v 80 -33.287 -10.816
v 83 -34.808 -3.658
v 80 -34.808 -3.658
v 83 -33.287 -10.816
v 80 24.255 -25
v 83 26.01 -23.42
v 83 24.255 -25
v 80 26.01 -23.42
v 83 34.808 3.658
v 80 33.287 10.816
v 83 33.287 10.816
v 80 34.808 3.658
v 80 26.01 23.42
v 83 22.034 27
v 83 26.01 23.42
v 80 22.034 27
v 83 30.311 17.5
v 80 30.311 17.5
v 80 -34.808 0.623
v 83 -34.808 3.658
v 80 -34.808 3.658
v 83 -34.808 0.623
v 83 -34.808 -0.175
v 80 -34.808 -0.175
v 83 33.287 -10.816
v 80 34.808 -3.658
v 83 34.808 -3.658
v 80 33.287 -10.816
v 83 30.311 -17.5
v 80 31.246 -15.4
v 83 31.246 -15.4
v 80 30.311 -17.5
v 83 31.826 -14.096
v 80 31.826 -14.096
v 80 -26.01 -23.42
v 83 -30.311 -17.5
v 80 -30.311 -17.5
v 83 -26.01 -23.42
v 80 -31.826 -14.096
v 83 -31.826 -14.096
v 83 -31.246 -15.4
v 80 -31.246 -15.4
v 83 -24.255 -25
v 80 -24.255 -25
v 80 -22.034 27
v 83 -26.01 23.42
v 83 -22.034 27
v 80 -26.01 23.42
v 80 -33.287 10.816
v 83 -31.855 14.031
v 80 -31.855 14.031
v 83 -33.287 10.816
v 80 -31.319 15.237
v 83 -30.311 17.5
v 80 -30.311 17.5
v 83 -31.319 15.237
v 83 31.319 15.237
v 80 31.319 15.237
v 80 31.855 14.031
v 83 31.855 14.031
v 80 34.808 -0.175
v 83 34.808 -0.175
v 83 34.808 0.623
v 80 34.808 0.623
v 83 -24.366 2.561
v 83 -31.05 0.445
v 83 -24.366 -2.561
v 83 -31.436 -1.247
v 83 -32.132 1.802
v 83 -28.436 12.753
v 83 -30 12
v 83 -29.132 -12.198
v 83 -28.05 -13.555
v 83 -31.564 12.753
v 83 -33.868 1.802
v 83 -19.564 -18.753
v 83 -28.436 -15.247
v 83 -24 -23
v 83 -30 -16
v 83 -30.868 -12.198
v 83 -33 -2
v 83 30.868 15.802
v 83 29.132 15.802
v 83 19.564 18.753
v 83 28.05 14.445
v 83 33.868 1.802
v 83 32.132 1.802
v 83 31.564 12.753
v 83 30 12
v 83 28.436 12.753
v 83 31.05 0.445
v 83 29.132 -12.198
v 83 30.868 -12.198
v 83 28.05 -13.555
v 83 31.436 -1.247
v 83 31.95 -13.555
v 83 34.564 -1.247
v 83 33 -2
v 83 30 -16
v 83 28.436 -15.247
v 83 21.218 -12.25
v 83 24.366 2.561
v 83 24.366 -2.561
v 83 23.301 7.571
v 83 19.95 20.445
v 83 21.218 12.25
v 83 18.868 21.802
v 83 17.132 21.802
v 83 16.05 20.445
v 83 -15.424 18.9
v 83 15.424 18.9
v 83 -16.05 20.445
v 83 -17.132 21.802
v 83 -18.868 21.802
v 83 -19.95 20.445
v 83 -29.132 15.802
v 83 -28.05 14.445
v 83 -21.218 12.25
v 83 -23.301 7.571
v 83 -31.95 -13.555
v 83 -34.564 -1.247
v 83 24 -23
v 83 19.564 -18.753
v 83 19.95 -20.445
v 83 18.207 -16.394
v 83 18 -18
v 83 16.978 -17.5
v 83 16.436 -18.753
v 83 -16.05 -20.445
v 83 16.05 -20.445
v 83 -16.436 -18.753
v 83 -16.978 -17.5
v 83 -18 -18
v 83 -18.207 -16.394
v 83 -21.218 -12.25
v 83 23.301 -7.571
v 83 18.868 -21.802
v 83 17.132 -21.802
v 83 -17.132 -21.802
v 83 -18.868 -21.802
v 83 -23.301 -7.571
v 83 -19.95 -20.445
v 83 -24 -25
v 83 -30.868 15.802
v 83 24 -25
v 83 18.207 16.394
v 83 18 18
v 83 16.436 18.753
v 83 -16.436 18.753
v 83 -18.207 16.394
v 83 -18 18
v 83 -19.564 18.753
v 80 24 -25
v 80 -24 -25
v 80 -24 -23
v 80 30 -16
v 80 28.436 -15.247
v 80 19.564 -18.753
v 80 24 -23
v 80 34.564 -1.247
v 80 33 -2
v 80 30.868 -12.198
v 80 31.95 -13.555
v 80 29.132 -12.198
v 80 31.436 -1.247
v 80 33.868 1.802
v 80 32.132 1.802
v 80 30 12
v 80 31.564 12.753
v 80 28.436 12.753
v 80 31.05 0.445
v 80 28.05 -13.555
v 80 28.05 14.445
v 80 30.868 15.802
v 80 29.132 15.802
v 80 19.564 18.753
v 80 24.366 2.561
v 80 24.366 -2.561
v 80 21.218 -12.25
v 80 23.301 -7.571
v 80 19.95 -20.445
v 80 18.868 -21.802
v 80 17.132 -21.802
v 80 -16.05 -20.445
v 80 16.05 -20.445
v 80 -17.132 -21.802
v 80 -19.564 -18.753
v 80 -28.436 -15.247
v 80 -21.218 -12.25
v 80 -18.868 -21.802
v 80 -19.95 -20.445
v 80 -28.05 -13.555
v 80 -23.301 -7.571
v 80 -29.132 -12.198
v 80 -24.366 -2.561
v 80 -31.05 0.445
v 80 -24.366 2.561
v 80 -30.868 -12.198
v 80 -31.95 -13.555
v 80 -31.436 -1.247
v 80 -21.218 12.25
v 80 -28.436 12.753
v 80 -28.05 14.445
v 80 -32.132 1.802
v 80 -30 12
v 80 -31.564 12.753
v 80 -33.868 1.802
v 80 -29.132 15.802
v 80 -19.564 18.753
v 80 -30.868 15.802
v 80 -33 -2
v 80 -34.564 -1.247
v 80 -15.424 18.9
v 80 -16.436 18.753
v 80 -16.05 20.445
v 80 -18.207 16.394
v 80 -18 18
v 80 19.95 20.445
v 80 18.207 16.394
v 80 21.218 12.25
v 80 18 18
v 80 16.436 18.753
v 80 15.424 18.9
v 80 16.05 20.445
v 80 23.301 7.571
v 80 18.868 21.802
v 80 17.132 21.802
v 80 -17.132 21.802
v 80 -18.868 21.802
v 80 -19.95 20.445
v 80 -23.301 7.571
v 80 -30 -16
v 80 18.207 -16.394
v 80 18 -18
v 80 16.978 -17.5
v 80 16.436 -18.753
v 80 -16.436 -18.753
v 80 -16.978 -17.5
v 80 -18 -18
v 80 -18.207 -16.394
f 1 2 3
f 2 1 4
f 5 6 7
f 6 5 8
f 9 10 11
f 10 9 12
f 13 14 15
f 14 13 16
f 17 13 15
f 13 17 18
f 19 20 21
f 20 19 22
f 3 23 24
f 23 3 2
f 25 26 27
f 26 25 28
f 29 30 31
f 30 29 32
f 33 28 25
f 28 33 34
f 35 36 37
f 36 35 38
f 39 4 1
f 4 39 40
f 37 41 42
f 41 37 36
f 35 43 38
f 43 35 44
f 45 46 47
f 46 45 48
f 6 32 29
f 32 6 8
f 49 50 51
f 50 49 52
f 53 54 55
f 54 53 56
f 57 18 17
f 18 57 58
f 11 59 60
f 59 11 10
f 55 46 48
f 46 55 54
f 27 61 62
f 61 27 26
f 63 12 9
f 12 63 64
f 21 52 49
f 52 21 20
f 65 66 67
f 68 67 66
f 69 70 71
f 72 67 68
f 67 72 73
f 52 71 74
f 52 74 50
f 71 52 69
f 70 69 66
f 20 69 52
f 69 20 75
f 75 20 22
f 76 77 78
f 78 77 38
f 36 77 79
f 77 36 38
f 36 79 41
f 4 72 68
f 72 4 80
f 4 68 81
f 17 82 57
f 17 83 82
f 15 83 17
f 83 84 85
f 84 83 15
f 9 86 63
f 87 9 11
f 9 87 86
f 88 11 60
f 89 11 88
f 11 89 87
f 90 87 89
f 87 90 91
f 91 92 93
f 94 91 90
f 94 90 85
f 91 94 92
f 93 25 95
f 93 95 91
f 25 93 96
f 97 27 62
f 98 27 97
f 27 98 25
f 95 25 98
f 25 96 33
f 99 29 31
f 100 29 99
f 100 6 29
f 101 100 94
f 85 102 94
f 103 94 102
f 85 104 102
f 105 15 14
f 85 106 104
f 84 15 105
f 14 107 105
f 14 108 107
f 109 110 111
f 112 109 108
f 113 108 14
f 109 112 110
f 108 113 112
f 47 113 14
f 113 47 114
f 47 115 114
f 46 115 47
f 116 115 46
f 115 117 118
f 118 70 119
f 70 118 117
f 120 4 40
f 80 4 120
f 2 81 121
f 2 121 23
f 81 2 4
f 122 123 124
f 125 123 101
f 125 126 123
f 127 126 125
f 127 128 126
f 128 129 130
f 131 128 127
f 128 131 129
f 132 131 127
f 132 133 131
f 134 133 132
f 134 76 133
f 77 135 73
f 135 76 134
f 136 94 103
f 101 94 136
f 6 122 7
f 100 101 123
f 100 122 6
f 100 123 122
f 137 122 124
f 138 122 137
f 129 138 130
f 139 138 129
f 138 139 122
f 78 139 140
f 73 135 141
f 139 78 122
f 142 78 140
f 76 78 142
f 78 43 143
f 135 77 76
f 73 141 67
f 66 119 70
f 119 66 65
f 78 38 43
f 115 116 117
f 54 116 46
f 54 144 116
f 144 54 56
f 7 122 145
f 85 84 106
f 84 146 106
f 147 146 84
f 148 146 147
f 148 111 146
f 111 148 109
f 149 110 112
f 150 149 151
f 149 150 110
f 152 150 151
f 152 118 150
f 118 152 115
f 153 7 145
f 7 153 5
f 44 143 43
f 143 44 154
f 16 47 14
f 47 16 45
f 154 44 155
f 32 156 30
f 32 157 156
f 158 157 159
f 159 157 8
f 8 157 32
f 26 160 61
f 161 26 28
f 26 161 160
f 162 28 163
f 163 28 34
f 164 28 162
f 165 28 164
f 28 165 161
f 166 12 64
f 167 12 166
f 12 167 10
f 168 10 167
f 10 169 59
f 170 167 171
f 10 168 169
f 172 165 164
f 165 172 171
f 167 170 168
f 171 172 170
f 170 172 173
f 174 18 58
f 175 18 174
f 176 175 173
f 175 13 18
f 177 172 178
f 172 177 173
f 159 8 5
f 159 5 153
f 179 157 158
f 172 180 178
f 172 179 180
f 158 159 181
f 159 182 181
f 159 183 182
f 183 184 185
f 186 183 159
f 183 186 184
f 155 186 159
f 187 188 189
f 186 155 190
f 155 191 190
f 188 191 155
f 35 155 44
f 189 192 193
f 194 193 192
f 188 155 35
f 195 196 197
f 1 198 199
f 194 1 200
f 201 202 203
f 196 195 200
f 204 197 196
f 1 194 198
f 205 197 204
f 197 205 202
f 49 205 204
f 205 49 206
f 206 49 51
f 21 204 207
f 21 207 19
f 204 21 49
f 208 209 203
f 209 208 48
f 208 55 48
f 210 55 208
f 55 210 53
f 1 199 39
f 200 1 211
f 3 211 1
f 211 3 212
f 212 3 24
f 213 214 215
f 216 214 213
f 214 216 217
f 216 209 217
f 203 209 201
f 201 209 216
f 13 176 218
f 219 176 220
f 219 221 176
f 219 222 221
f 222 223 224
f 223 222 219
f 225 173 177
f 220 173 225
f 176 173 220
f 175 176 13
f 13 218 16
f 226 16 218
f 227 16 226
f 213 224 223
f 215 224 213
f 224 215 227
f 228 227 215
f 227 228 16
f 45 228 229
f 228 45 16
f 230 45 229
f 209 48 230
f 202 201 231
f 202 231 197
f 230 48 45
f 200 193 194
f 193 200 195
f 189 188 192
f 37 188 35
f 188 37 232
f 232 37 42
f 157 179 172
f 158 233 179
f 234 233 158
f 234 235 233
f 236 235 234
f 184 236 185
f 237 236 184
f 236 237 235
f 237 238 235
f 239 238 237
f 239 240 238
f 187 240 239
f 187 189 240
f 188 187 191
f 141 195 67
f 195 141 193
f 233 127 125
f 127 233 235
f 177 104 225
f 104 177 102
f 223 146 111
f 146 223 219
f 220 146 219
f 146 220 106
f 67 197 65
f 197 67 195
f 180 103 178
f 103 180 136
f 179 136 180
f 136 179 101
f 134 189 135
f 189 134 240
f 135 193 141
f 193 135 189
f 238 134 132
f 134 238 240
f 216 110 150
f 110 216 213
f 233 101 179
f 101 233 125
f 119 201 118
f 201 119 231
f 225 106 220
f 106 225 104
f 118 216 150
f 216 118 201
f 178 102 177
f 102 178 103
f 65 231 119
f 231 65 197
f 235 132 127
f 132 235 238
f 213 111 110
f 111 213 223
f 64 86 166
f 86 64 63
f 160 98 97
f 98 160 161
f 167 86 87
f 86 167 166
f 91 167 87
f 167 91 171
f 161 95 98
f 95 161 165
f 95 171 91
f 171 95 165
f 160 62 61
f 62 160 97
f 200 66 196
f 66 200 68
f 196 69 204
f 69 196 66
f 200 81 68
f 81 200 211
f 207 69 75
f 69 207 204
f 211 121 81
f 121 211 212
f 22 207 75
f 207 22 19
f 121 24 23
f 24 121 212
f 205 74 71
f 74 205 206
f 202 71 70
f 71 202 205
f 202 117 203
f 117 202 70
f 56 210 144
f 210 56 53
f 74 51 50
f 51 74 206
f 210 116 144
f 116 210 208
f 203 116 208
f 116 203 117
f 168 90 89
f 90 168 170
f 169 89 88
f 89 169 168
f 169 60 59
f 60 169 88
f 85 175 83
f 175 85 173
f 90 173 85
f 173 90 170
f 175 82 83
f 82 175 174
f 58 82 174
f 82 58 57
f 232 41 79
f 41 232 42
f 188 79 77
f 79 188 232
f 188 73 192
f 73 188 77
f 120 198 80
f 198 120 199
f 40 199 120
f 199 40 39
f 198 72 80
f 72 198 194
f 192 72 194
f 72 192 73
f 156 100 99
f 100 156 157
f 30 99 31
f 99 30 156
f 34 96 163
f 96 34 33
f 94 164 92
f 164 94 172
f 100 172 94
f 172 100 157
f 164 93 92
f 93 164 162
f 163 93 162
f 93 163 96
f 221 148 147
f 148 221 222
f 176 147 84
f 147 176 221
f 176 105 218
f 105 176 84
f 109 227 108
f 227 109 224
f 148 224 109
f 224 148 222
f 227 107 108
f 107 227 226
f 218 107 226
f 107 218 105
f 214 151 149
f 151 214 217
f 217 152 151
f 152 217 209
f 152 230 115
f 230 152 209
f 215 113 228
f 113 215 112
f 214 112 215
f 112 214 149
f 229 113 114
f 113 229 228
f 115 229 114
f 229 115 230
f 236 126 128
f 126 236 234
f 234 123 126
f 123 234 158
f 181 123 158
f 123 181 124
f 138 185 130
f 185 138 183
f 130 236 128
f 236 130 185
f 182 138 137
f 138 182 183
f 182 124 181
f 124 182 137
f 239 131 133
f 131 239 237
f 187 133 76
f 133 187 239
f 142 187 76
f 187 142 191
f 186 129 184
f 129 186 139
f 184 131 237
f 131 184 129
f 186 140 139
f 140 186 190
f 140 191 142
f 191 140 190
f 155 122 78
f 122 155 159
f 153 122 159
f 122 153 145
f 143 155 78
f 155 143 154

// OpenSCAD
// file: rib.scad
module solid_rib(){
scale(0.42)
linear_extrude(file = "rib/NACA_4415_circles_lighter.dxf",
height = 10, convexity = 10
);
}


module rib(rod_leading,rod_trailing){
difference(){
solid_rib();
translate([12,11,-1])
cylinder(r=rod_leading/2,h=100);

translate([146,5,-1])
cylinder(r=rod_trailing/2,h=100);

}
}

rib(8,6);
// file: right_wing.scad
 
use<rib.scad>;
use <left_wing.scad>



module vrib(){
rotate([90,0,0])
rib(8,6);
}

module rods_right_wing(){

mirror([0,1,0])
rods_left_wing();

}

module right_wing(){
mirror([0,1,0])
left_wing();

}

right_wing();
// file: left_wing.scad
 
use<rib.scad>;

module vrib(){
rotate([90,0,0])
rib(8,6);
}

module rods_left_wing(){

translate([0,-52,0]){
// Rods
translate([0,50,0])
rotate([90,0,0])
translate([12,11,14])
cylinder(r=9/2,h=840);

translate([0,50,0])
rotate([90,0,0])
translate([146,5,14])
cylinder(r=7/2,h=840);

}
}

module left_wing(){

rods_left_wing();

translate([0,-52,0]){


// Ribs
for(i=[0:6])
translate([0,-i*((850-50)/6),0])vrib();
}

}

left_wing();
// file: wings_support.scad
use <wings.scad>;

module rod_supports(){
  difference(){
  union(){
  translate([19+0.5,-24+4+0.5,25]) cube([155-8-30-1,40-1,5]);

  translate([19+0.5-18,-24+4+0.5-10,30]) cube([155-8-30-1+36,40-1+20,18]);
  }
  union(){
    rods_both_wings();
    translate([19.5,-20.5,33]) cube([155-8-30-1,40-1,50]);
    rotate([0,3,0]) translate([19+0.5-18,-24+4+0.5-10,49]) cube([155-8-30-1+36,40-1+20,18]);
  }
  }
}


  //both_wings();

//
//module rod_supports(){
//  // Supports for wing rods (without holes)
//
//difference(){
//union(){
//  // rod suport front (with cover screw holes)
//    translate([1, -40, 7]) cube([18, 80, 17]);
//    translate([1, -3/2, -40]) cube([18, 3, 60]);
//    translate([1, -40, -25]) cube([18, 80, 8]);
//
//  difference(){
//    union(){
//      // rod suport back (with cover screw holes)
//      translate([135, -40, 1]) cube([18, 80, 23]);
//      translate([136, -3/2, -40]) cube([18, 3, 48]);
//    }
//    union(){
//      translate([134, -46/2, 12])
//      cube([19+2, 46, 30]);
//    }
//  }
//}
//  difference(){
//    rotate([0, 90, 0]) cylinder(r = 100 / 2, h = 155);
//    rotate([0, 90, 0]) cylinder(r = 70 / 2, h = 155);
//  }
//}
//
//}
rod_supports();
// file: body_rib.scad
module body_rib_solid(height){
difference(){
  translate([0,-35,-35])cube([height,70,70]);
  union(){
    difference(){
      translate([-1,0,0]) rotate([0,90,0]) cylinder(r=100,h=height+2);
      translate([-1,0,0]) rotate([0,90,0]) cylinder(r=35,h=height+2);
    }
    // Down plane
    translate([-1,-25,-35])cube([height+1,50,10]);
    // Upper plane
    translate([-1,-25,27])cube([height+1,50,30]);
  }
}
}


module body_rib(height){
  difference(){
    body_rib_solid(height);
    scale([1.1,0.7,0.7]) body_rib_solid(height);
  }
}


body_rib(3);
// file: tail.scad
module tail_up_front(){
  translate([0,0,2]){
    difference(){
      union(){
        scale(0.8) translate([500,-65.2,-13]){
          difference(){
            translate([0,-22,0]) scale([0.6,0.4,0.6])
              linear_extrude(file = "tail/front.dxf",height = 200, convexity = 10);
            union(){
              translate([110,60-5,-1])
              cube([36,70+5,20+15]);
              translate([110,60-5,101])
              cube([36,70+5,20]);
              translate([110,60-5,30+15])
              cube([16,70+5,60-15]);
            }
          }
        }
      }
      translate([400,-100,-7.5-300])cube(300);
    }
    translate([0,0,3])tail_upper_socket();
  }
}

module tail_front(){
difference(){
  union(){
    scale(0.8) translate([500,-65.2,-13]){
      difference(){
        translate([0,-22,0]) scale([0.6,0.4,0.6])
          linear_extrude(file = "tail/front.dxf",height = 200, convexity = 10);
        union(){
          translate([110,60-5,-1])
          cube([36,70+5,20+15]);
          translate([110,60-5,101])
          cube([36,70+5,20]);
          translate([110,60-5,30+15])
          cube([16,70+5,60-15]);
        }
      }
    }
  }
  translate([400,-100,-7.501])cube(300);
}

}

module tail_back(){
  scale(0.8) translate([500,-65.2,-13]) {
  difference(){
  scale([0.6,0.3,0.6])
  scale([0.6,1,1])
  translate([120,0,0])
  linear_extrude(file = "tail/back.dxf",height = 200, convexity = 10);
  union(){
    translate([110,60,18+15])
    cube([22,70,120-36-15]);
    translate([110,0,0]) rotate([0,45+14,0]) cube([100,297,300]);
    translate([110,0,-1-5+3]) cube([60,297,11]);
  }
  }
  }

}

module tail_rod(){
      translate([110, 0, -12])rotate([0,90,0])cylinder(r=3.7,h=370);
}

module tail_unstranlated(){
difference(){
union(){
  tail_front();
  tail_back();
}
    translate([120,65,-1])
cylinder(r=2,h=200);

}
}

module tail(){
  difference(){
    tail_unstranlated();
    tail_rod();
  }
}

module tail_socket(){
  difference(){
    translate([450,0,-10]) cube([70,20,5],center=true);
    union(){
      tail_rod();
      translate([450,-7,-100]) cylinder(r=2,h=400);
      translate([475,-8,-100]) cylinder(r=2,h=400);
      translate([425,-6,-100]) cylinder(r=2,h=400);
      translate([450,7,-100]) cylinder(r=2,h=400);
      translate([475,8,-100]) cylinder(r=2,h=400);
      translate([425,6,-100]) cylinder(r=2,h=400);
    }
  }
}

module tail_upper_socket(){
  difference(){
    translate([450,0,-10]) cube([70,20,3],center=true);
    union(){
      translate([450,-7,-100]) cylinder(r=2,h=400);
     translate([475,-8,-100]) cylinder(r=2,h=400);
     translate([425,-6,-100]) cylinder(r=2,h=400);
     translate([450,7,-100]) cylinder(r=2,h=400);
     translate([475,8,-100]) cylinder(r=2,h=400);
     translate([425,6,-100]) cylinder(r=2,h=400);
    }
  }
}

module tail_socket_bottom(){
  back_wheel();
  difference(){
    translate([450,0,-19]) cube([70,20,3],center=true);
    union(){
      tail_rod();
      translate([450,-7,-100]) cylinder(r=2,h=400);
     translate([475,-8,-100]) cylinder(r=2,h=400);
     translate([425,-6,-100]) cylinder(r=2,h=400);
     translate([450,7,-100]) cylinder(r=2,h=400);
     translate([475,8,-100]) cylinder(r=2,h=400);
     translate([425,6,-100]) cylinder(r=2,h=400);
    }
  }
}

module back_wheel(){
difference(){
 translate([470,0,-28]) cube([20,6,20],center=true);
 translate([470-10,-6+12,-28-20]) rotate([0,45,0]) cube([40,40,40],center=true);
}
}

module elevator_fixed(){
difference(){
  union(){
    translate([500*0.8,48/0.7,-66]) rotate([90,0,0])
    scale([0.48,0.24,0.7]) linear_extrude(file = "tail/front.dxf",height = 200, convexity = 10);
  }
  union(){
    tail_rod();
      translate([450,-7,-100]) cylinder(r=2,h=400);
     translate([475,-8,-100]) cylinder(r=2,h=400);
     translate([425,-6,-100]) cylinder(r=2,h=400);
     translate([450,7,-100]) cylinder(r=2,h=400);
     translate([475,8,-100]) cylinder(r=2,h=400);
     translate([425,6,-100]) cylinder(r=2,h=400);
    translate([150,-200,-17-5/2]) cube([1000,1000,5]);
    translate([490,-60,-100]) cube([50,117,300]);
    translate([497,200,-12.5]) rotate([90,0,0]) cylinder(r=1,h=400);
  }
}
}

module elevator(){
  difference(){
    difference(){
      translate([500*0.8-3+35,48/0.7,-66]) rotate([90,0,0]) scale([0.3,0.24,0.7])
      linear_extrude(file = "tail/back.dxf",height = 200, convexity = 10);
      union(){
        translate([150,-200,-17-5/2]) cube([1000,1000,5]);
        translate([490,-90,-100]) cube([16,31,300]);
        translate([490,-60+117+1-2,-100]) cube([16,297,300]);
      }
  }
    translate([497,200,-12.5]) rotate([90,0,0]) cylinder(r=1,h=400);
  }
  
}

module tail_full(){
  tail();
  tail_up_front();
  tail_rod();
  tail_socket();
  tail_socket_bottom();
  elevator_fixed();
  elevator();
}


tail_full();
// file: nose.scad
module nose_one_hole(){
  translate([-25,18,20])
  rotate([0,90,0])
  cylinder(r=2,h=600);
  nose_one_countersunk();
}

module nose_one_countersunk(){
  translate([-30,18,20])
  rotate([0,90,0])
  cylinder(r=3.2,h=20);
}

module nose_one_screw_cylinder(){
  translate([-21,18,20]) rotate([0,90,0]) cylinder(r=3.6,h=21);
}

module nose_screw_cylinders(){
  mirror([0,0,0]) nose_one_screw_cylinder();
  mirror([0,1,0]) nose_one_screw_cylinder();
  mirror([0,0,1]) nose_one_screw_cylinder();
  mirror([0,1,0])mirror([0,0,1]) nose_one_screw_cylinder();
}

module nose_holes(){
  mirror([0,0,0]) nose_one_hole();
  mirror([0,1,0]) nose_one_hole();
  mirror([0,0,1]) nose_one_hole();
  mirror([0,1,0])mirror([0,0,1]) nose_one_hole();
}

module nose(){

difference(){
  nose_no_holes();
  nose_holes();
}

}

module nose_no_holes(){
      nose_screw_cylinders();
translate([155,0,0])
rotate([0,180,0])
  difference(){
    union(){
      difference(){
          translate([155,0,0])
          rotate([0,90,0])
          cylinder(r1=35,r2=15,h=50);

        union(){

          // Inner
          translate([154,0,0])
          rotate([0,90,0])
          cylinder(r1=32,r2=12,h=52);

          // Upper plane
          translate([1,-100,-63+1])
          cube([2000,2000,38]);

          // Down plane
          translate([1,-100,27-3])
          cube([2000,2000,40]);
        }
      }
      // Upper plane
      translate([155+0.1,-25,-27])
      cube([30,50,3]);

      // Down plane
      translate([155+0.1,-25,26-4])
      cube([30,50,3]);

    }

    // Clear perimeter of nose
    difference(){
      translate([155,0,0])
      rotate([0,90,0])
      cylinder(r1=370,r2=170,h=60);

      translate([155,0,0])
      rotate([0,90,0])
      cylinder(r1=35,r2=15,h=50);

    }
  }
}
module 
motor_hole(){
  translate([-70,15.556/2,15.556/2])
  rotate([0,90,0])
  cylinder(r1=2,r2=2,h=100);
}
module motor_holes(){
  mirror([0,0,0])motor_hole();
  mirror([0,1,0])motor_hole();
  mirror([0,0,1])motor_hole();
  mirror([0,1,1])motor_hole();
    translate([-70,0,-17])
    rotate([0,90,0])
    cylinder(r=5,h=100);
}

module motor_plate(){
    difference(){

  translate([0,-35,-30])cube([5,70,70]);
  union(){
  difference(){
    translate([-1,0,0]) rotate([0,90,0]) cylinder(r=100,h=50);
    translate([0,0,0]) rotate([0,90,0]) cylinder(r=35,h=50);
  }
      // Upper plane
      translate([-1,-25,-35])
      cube([30,50,10]);

      // Down plane
      translate([-1,-25,27])
      cube([30,50,30]);



nose_holes();
motor_holes();

  }

    }



}

nose();

motor_plate();
// file: wings.scad
use <left_wing.scad>;
use <right_wing.scad>;



// wings 
dihedral_angle = 10;

module both_wings(){
    translate([2, 10, 27])
	rotate([-dihedral_angle / 2, 0, 0])
	left_wing();
    translate([2, -10, 27])
	rotate([dihedral_angle / 2, 0, 0])
	right_wing();
}

module rods_both_wings(){
    translate([2, 10, 27])
	rotate([-dihedral_angle / 2, 0, 0])
	rods_left_wing();
    translate([2, -10, 27])
	rotate([dihedral_angle / 2, 0, 0])
	rods_right_wing();
}


  


both_wings();
//translate([0,0,30])
//rods_both_wings();
// file: body.scad
use <wings.scad>;
use <nose.scad>;
use <tail.scad>;
use <body_rib.scad>;
use <wings_support.scad>;

module boxing(){

  // First rib
  translate([5,0,0]) body_rib(3);

  // Last rib
  translate([152,0,0]) body_rib_solid(3);

  // Medium rib (if necessary)
  translate([80,0,0]) body_rib(3);

}


module right_cover_support(){
  // Right cover support
  difference(){
    translate([0,60/2-15,14])
    cube([155,10,10]);
    translate([-1,60/2-15-20-6,13])
    rotate([-55,0,0])
    cube([157,30,30]);
  }
}


module front_back_covers(){
  difference(){
    union(){
      rotate([0,90,0]) cylinder(r = 70 / 2, h = 2);
      translate([155-2,0,0]) rotate([0, 90, 0]) cylinder(r = 70 / 2, h = 2);
    }
    translate([-10,-100,24]) cube([200,200,200]);
  }
}

module bottom_plate(){
  translate([0,-24,-25]) cube([155,48,2]);
  translate([8,-24,-25]) cube([10,10,10]);
  translate([8,-24+48-10,-25]) cube([10,10,10]);

  translate([155-10-3.5,-24,-25]) cube([10,10,10]);
  translate([155-10-3.5,-24+48-10,-25]) cube([10,10,10]);
}

module upper_plate(){
translate([0,0,2])
difference(){
  rotate([180,0,0])bottom_plate();
  translate([19,-24+4,20]) cube([155-8-30,40,20]);
}
}


module carbon_fiber_holes(){
  translate([0,33,0])
  rotate([0,90,0])
  cylinder(r=2,h=155);
  translate([0,-33,0])
  rotate([0,90,0])
  cylinder(r=2,h=155);

  translate([0,-30,14])
  rotate([0,90,0])
  cylinder(r=2,h=155);
  translate([0,30,14])
  rotate([0,90,0])
  cylinder(r=2,h=155);

  translate([0,-30,-14])
  rotate([0,90,0])
  cylinder(r=2,h=155);
  translate([0,30,-14])
  rotate([0,90,0])
  cylinder(r=2,h=155);


}

module body(){

    difference() {
      union () {
        boxing();
        //rod_supports();
        //front_back_covers();
        bottom_plate();
        upper_plate();
        tail_rod_support();
        tail_rod_cover();
        carbon_fiber_holes();
        
      }
      union () {
        nose_holes();
        tail_rod();
        tail_rod_screws();
        carbon_fiber_holes();

      }
    }
  }

module tail_rod_screws(){
  translate([121, -7, -50]) cylinder(r=2,h=100);
  mirror([0,1,0])translate([121, -7, -50]) cylinder(r=2,h=100);

  translate([128, -7, -50]) cylinder(r=2,h=100);
  mirror([0,1,0])translate([128, -7, -50]) cylinder(r=2,h=100);
}

module tail_rod_support(){
    translate([134, -10, -24]) cube([18, 20, 20]);
    translate([134-18, -10, -24]) cube([18, 20, 10]);
}

module tail_rod_cover(){
    translate([134-18, -10, -14+2]) cube([16, 20, 8]);
}


  body();
  nose();
  motor_plate();
  both_wings();
  //tail_full();
  tail_rod();
  rod_supports();
// main file
use <body.scad>;
use <wings.scad>;
use <nose.scad>;
use <tail.scad>;
use <body_rib.scad>;


difference(){
union(){
translate([80,0,0]) body_rib(3);

}

union(){
  carbon_fiber_holes();
  nose_holes();
  tail_rod();
  tail_rod_screws();
  tail_rod_support();
  bottom_plate();

}
}
